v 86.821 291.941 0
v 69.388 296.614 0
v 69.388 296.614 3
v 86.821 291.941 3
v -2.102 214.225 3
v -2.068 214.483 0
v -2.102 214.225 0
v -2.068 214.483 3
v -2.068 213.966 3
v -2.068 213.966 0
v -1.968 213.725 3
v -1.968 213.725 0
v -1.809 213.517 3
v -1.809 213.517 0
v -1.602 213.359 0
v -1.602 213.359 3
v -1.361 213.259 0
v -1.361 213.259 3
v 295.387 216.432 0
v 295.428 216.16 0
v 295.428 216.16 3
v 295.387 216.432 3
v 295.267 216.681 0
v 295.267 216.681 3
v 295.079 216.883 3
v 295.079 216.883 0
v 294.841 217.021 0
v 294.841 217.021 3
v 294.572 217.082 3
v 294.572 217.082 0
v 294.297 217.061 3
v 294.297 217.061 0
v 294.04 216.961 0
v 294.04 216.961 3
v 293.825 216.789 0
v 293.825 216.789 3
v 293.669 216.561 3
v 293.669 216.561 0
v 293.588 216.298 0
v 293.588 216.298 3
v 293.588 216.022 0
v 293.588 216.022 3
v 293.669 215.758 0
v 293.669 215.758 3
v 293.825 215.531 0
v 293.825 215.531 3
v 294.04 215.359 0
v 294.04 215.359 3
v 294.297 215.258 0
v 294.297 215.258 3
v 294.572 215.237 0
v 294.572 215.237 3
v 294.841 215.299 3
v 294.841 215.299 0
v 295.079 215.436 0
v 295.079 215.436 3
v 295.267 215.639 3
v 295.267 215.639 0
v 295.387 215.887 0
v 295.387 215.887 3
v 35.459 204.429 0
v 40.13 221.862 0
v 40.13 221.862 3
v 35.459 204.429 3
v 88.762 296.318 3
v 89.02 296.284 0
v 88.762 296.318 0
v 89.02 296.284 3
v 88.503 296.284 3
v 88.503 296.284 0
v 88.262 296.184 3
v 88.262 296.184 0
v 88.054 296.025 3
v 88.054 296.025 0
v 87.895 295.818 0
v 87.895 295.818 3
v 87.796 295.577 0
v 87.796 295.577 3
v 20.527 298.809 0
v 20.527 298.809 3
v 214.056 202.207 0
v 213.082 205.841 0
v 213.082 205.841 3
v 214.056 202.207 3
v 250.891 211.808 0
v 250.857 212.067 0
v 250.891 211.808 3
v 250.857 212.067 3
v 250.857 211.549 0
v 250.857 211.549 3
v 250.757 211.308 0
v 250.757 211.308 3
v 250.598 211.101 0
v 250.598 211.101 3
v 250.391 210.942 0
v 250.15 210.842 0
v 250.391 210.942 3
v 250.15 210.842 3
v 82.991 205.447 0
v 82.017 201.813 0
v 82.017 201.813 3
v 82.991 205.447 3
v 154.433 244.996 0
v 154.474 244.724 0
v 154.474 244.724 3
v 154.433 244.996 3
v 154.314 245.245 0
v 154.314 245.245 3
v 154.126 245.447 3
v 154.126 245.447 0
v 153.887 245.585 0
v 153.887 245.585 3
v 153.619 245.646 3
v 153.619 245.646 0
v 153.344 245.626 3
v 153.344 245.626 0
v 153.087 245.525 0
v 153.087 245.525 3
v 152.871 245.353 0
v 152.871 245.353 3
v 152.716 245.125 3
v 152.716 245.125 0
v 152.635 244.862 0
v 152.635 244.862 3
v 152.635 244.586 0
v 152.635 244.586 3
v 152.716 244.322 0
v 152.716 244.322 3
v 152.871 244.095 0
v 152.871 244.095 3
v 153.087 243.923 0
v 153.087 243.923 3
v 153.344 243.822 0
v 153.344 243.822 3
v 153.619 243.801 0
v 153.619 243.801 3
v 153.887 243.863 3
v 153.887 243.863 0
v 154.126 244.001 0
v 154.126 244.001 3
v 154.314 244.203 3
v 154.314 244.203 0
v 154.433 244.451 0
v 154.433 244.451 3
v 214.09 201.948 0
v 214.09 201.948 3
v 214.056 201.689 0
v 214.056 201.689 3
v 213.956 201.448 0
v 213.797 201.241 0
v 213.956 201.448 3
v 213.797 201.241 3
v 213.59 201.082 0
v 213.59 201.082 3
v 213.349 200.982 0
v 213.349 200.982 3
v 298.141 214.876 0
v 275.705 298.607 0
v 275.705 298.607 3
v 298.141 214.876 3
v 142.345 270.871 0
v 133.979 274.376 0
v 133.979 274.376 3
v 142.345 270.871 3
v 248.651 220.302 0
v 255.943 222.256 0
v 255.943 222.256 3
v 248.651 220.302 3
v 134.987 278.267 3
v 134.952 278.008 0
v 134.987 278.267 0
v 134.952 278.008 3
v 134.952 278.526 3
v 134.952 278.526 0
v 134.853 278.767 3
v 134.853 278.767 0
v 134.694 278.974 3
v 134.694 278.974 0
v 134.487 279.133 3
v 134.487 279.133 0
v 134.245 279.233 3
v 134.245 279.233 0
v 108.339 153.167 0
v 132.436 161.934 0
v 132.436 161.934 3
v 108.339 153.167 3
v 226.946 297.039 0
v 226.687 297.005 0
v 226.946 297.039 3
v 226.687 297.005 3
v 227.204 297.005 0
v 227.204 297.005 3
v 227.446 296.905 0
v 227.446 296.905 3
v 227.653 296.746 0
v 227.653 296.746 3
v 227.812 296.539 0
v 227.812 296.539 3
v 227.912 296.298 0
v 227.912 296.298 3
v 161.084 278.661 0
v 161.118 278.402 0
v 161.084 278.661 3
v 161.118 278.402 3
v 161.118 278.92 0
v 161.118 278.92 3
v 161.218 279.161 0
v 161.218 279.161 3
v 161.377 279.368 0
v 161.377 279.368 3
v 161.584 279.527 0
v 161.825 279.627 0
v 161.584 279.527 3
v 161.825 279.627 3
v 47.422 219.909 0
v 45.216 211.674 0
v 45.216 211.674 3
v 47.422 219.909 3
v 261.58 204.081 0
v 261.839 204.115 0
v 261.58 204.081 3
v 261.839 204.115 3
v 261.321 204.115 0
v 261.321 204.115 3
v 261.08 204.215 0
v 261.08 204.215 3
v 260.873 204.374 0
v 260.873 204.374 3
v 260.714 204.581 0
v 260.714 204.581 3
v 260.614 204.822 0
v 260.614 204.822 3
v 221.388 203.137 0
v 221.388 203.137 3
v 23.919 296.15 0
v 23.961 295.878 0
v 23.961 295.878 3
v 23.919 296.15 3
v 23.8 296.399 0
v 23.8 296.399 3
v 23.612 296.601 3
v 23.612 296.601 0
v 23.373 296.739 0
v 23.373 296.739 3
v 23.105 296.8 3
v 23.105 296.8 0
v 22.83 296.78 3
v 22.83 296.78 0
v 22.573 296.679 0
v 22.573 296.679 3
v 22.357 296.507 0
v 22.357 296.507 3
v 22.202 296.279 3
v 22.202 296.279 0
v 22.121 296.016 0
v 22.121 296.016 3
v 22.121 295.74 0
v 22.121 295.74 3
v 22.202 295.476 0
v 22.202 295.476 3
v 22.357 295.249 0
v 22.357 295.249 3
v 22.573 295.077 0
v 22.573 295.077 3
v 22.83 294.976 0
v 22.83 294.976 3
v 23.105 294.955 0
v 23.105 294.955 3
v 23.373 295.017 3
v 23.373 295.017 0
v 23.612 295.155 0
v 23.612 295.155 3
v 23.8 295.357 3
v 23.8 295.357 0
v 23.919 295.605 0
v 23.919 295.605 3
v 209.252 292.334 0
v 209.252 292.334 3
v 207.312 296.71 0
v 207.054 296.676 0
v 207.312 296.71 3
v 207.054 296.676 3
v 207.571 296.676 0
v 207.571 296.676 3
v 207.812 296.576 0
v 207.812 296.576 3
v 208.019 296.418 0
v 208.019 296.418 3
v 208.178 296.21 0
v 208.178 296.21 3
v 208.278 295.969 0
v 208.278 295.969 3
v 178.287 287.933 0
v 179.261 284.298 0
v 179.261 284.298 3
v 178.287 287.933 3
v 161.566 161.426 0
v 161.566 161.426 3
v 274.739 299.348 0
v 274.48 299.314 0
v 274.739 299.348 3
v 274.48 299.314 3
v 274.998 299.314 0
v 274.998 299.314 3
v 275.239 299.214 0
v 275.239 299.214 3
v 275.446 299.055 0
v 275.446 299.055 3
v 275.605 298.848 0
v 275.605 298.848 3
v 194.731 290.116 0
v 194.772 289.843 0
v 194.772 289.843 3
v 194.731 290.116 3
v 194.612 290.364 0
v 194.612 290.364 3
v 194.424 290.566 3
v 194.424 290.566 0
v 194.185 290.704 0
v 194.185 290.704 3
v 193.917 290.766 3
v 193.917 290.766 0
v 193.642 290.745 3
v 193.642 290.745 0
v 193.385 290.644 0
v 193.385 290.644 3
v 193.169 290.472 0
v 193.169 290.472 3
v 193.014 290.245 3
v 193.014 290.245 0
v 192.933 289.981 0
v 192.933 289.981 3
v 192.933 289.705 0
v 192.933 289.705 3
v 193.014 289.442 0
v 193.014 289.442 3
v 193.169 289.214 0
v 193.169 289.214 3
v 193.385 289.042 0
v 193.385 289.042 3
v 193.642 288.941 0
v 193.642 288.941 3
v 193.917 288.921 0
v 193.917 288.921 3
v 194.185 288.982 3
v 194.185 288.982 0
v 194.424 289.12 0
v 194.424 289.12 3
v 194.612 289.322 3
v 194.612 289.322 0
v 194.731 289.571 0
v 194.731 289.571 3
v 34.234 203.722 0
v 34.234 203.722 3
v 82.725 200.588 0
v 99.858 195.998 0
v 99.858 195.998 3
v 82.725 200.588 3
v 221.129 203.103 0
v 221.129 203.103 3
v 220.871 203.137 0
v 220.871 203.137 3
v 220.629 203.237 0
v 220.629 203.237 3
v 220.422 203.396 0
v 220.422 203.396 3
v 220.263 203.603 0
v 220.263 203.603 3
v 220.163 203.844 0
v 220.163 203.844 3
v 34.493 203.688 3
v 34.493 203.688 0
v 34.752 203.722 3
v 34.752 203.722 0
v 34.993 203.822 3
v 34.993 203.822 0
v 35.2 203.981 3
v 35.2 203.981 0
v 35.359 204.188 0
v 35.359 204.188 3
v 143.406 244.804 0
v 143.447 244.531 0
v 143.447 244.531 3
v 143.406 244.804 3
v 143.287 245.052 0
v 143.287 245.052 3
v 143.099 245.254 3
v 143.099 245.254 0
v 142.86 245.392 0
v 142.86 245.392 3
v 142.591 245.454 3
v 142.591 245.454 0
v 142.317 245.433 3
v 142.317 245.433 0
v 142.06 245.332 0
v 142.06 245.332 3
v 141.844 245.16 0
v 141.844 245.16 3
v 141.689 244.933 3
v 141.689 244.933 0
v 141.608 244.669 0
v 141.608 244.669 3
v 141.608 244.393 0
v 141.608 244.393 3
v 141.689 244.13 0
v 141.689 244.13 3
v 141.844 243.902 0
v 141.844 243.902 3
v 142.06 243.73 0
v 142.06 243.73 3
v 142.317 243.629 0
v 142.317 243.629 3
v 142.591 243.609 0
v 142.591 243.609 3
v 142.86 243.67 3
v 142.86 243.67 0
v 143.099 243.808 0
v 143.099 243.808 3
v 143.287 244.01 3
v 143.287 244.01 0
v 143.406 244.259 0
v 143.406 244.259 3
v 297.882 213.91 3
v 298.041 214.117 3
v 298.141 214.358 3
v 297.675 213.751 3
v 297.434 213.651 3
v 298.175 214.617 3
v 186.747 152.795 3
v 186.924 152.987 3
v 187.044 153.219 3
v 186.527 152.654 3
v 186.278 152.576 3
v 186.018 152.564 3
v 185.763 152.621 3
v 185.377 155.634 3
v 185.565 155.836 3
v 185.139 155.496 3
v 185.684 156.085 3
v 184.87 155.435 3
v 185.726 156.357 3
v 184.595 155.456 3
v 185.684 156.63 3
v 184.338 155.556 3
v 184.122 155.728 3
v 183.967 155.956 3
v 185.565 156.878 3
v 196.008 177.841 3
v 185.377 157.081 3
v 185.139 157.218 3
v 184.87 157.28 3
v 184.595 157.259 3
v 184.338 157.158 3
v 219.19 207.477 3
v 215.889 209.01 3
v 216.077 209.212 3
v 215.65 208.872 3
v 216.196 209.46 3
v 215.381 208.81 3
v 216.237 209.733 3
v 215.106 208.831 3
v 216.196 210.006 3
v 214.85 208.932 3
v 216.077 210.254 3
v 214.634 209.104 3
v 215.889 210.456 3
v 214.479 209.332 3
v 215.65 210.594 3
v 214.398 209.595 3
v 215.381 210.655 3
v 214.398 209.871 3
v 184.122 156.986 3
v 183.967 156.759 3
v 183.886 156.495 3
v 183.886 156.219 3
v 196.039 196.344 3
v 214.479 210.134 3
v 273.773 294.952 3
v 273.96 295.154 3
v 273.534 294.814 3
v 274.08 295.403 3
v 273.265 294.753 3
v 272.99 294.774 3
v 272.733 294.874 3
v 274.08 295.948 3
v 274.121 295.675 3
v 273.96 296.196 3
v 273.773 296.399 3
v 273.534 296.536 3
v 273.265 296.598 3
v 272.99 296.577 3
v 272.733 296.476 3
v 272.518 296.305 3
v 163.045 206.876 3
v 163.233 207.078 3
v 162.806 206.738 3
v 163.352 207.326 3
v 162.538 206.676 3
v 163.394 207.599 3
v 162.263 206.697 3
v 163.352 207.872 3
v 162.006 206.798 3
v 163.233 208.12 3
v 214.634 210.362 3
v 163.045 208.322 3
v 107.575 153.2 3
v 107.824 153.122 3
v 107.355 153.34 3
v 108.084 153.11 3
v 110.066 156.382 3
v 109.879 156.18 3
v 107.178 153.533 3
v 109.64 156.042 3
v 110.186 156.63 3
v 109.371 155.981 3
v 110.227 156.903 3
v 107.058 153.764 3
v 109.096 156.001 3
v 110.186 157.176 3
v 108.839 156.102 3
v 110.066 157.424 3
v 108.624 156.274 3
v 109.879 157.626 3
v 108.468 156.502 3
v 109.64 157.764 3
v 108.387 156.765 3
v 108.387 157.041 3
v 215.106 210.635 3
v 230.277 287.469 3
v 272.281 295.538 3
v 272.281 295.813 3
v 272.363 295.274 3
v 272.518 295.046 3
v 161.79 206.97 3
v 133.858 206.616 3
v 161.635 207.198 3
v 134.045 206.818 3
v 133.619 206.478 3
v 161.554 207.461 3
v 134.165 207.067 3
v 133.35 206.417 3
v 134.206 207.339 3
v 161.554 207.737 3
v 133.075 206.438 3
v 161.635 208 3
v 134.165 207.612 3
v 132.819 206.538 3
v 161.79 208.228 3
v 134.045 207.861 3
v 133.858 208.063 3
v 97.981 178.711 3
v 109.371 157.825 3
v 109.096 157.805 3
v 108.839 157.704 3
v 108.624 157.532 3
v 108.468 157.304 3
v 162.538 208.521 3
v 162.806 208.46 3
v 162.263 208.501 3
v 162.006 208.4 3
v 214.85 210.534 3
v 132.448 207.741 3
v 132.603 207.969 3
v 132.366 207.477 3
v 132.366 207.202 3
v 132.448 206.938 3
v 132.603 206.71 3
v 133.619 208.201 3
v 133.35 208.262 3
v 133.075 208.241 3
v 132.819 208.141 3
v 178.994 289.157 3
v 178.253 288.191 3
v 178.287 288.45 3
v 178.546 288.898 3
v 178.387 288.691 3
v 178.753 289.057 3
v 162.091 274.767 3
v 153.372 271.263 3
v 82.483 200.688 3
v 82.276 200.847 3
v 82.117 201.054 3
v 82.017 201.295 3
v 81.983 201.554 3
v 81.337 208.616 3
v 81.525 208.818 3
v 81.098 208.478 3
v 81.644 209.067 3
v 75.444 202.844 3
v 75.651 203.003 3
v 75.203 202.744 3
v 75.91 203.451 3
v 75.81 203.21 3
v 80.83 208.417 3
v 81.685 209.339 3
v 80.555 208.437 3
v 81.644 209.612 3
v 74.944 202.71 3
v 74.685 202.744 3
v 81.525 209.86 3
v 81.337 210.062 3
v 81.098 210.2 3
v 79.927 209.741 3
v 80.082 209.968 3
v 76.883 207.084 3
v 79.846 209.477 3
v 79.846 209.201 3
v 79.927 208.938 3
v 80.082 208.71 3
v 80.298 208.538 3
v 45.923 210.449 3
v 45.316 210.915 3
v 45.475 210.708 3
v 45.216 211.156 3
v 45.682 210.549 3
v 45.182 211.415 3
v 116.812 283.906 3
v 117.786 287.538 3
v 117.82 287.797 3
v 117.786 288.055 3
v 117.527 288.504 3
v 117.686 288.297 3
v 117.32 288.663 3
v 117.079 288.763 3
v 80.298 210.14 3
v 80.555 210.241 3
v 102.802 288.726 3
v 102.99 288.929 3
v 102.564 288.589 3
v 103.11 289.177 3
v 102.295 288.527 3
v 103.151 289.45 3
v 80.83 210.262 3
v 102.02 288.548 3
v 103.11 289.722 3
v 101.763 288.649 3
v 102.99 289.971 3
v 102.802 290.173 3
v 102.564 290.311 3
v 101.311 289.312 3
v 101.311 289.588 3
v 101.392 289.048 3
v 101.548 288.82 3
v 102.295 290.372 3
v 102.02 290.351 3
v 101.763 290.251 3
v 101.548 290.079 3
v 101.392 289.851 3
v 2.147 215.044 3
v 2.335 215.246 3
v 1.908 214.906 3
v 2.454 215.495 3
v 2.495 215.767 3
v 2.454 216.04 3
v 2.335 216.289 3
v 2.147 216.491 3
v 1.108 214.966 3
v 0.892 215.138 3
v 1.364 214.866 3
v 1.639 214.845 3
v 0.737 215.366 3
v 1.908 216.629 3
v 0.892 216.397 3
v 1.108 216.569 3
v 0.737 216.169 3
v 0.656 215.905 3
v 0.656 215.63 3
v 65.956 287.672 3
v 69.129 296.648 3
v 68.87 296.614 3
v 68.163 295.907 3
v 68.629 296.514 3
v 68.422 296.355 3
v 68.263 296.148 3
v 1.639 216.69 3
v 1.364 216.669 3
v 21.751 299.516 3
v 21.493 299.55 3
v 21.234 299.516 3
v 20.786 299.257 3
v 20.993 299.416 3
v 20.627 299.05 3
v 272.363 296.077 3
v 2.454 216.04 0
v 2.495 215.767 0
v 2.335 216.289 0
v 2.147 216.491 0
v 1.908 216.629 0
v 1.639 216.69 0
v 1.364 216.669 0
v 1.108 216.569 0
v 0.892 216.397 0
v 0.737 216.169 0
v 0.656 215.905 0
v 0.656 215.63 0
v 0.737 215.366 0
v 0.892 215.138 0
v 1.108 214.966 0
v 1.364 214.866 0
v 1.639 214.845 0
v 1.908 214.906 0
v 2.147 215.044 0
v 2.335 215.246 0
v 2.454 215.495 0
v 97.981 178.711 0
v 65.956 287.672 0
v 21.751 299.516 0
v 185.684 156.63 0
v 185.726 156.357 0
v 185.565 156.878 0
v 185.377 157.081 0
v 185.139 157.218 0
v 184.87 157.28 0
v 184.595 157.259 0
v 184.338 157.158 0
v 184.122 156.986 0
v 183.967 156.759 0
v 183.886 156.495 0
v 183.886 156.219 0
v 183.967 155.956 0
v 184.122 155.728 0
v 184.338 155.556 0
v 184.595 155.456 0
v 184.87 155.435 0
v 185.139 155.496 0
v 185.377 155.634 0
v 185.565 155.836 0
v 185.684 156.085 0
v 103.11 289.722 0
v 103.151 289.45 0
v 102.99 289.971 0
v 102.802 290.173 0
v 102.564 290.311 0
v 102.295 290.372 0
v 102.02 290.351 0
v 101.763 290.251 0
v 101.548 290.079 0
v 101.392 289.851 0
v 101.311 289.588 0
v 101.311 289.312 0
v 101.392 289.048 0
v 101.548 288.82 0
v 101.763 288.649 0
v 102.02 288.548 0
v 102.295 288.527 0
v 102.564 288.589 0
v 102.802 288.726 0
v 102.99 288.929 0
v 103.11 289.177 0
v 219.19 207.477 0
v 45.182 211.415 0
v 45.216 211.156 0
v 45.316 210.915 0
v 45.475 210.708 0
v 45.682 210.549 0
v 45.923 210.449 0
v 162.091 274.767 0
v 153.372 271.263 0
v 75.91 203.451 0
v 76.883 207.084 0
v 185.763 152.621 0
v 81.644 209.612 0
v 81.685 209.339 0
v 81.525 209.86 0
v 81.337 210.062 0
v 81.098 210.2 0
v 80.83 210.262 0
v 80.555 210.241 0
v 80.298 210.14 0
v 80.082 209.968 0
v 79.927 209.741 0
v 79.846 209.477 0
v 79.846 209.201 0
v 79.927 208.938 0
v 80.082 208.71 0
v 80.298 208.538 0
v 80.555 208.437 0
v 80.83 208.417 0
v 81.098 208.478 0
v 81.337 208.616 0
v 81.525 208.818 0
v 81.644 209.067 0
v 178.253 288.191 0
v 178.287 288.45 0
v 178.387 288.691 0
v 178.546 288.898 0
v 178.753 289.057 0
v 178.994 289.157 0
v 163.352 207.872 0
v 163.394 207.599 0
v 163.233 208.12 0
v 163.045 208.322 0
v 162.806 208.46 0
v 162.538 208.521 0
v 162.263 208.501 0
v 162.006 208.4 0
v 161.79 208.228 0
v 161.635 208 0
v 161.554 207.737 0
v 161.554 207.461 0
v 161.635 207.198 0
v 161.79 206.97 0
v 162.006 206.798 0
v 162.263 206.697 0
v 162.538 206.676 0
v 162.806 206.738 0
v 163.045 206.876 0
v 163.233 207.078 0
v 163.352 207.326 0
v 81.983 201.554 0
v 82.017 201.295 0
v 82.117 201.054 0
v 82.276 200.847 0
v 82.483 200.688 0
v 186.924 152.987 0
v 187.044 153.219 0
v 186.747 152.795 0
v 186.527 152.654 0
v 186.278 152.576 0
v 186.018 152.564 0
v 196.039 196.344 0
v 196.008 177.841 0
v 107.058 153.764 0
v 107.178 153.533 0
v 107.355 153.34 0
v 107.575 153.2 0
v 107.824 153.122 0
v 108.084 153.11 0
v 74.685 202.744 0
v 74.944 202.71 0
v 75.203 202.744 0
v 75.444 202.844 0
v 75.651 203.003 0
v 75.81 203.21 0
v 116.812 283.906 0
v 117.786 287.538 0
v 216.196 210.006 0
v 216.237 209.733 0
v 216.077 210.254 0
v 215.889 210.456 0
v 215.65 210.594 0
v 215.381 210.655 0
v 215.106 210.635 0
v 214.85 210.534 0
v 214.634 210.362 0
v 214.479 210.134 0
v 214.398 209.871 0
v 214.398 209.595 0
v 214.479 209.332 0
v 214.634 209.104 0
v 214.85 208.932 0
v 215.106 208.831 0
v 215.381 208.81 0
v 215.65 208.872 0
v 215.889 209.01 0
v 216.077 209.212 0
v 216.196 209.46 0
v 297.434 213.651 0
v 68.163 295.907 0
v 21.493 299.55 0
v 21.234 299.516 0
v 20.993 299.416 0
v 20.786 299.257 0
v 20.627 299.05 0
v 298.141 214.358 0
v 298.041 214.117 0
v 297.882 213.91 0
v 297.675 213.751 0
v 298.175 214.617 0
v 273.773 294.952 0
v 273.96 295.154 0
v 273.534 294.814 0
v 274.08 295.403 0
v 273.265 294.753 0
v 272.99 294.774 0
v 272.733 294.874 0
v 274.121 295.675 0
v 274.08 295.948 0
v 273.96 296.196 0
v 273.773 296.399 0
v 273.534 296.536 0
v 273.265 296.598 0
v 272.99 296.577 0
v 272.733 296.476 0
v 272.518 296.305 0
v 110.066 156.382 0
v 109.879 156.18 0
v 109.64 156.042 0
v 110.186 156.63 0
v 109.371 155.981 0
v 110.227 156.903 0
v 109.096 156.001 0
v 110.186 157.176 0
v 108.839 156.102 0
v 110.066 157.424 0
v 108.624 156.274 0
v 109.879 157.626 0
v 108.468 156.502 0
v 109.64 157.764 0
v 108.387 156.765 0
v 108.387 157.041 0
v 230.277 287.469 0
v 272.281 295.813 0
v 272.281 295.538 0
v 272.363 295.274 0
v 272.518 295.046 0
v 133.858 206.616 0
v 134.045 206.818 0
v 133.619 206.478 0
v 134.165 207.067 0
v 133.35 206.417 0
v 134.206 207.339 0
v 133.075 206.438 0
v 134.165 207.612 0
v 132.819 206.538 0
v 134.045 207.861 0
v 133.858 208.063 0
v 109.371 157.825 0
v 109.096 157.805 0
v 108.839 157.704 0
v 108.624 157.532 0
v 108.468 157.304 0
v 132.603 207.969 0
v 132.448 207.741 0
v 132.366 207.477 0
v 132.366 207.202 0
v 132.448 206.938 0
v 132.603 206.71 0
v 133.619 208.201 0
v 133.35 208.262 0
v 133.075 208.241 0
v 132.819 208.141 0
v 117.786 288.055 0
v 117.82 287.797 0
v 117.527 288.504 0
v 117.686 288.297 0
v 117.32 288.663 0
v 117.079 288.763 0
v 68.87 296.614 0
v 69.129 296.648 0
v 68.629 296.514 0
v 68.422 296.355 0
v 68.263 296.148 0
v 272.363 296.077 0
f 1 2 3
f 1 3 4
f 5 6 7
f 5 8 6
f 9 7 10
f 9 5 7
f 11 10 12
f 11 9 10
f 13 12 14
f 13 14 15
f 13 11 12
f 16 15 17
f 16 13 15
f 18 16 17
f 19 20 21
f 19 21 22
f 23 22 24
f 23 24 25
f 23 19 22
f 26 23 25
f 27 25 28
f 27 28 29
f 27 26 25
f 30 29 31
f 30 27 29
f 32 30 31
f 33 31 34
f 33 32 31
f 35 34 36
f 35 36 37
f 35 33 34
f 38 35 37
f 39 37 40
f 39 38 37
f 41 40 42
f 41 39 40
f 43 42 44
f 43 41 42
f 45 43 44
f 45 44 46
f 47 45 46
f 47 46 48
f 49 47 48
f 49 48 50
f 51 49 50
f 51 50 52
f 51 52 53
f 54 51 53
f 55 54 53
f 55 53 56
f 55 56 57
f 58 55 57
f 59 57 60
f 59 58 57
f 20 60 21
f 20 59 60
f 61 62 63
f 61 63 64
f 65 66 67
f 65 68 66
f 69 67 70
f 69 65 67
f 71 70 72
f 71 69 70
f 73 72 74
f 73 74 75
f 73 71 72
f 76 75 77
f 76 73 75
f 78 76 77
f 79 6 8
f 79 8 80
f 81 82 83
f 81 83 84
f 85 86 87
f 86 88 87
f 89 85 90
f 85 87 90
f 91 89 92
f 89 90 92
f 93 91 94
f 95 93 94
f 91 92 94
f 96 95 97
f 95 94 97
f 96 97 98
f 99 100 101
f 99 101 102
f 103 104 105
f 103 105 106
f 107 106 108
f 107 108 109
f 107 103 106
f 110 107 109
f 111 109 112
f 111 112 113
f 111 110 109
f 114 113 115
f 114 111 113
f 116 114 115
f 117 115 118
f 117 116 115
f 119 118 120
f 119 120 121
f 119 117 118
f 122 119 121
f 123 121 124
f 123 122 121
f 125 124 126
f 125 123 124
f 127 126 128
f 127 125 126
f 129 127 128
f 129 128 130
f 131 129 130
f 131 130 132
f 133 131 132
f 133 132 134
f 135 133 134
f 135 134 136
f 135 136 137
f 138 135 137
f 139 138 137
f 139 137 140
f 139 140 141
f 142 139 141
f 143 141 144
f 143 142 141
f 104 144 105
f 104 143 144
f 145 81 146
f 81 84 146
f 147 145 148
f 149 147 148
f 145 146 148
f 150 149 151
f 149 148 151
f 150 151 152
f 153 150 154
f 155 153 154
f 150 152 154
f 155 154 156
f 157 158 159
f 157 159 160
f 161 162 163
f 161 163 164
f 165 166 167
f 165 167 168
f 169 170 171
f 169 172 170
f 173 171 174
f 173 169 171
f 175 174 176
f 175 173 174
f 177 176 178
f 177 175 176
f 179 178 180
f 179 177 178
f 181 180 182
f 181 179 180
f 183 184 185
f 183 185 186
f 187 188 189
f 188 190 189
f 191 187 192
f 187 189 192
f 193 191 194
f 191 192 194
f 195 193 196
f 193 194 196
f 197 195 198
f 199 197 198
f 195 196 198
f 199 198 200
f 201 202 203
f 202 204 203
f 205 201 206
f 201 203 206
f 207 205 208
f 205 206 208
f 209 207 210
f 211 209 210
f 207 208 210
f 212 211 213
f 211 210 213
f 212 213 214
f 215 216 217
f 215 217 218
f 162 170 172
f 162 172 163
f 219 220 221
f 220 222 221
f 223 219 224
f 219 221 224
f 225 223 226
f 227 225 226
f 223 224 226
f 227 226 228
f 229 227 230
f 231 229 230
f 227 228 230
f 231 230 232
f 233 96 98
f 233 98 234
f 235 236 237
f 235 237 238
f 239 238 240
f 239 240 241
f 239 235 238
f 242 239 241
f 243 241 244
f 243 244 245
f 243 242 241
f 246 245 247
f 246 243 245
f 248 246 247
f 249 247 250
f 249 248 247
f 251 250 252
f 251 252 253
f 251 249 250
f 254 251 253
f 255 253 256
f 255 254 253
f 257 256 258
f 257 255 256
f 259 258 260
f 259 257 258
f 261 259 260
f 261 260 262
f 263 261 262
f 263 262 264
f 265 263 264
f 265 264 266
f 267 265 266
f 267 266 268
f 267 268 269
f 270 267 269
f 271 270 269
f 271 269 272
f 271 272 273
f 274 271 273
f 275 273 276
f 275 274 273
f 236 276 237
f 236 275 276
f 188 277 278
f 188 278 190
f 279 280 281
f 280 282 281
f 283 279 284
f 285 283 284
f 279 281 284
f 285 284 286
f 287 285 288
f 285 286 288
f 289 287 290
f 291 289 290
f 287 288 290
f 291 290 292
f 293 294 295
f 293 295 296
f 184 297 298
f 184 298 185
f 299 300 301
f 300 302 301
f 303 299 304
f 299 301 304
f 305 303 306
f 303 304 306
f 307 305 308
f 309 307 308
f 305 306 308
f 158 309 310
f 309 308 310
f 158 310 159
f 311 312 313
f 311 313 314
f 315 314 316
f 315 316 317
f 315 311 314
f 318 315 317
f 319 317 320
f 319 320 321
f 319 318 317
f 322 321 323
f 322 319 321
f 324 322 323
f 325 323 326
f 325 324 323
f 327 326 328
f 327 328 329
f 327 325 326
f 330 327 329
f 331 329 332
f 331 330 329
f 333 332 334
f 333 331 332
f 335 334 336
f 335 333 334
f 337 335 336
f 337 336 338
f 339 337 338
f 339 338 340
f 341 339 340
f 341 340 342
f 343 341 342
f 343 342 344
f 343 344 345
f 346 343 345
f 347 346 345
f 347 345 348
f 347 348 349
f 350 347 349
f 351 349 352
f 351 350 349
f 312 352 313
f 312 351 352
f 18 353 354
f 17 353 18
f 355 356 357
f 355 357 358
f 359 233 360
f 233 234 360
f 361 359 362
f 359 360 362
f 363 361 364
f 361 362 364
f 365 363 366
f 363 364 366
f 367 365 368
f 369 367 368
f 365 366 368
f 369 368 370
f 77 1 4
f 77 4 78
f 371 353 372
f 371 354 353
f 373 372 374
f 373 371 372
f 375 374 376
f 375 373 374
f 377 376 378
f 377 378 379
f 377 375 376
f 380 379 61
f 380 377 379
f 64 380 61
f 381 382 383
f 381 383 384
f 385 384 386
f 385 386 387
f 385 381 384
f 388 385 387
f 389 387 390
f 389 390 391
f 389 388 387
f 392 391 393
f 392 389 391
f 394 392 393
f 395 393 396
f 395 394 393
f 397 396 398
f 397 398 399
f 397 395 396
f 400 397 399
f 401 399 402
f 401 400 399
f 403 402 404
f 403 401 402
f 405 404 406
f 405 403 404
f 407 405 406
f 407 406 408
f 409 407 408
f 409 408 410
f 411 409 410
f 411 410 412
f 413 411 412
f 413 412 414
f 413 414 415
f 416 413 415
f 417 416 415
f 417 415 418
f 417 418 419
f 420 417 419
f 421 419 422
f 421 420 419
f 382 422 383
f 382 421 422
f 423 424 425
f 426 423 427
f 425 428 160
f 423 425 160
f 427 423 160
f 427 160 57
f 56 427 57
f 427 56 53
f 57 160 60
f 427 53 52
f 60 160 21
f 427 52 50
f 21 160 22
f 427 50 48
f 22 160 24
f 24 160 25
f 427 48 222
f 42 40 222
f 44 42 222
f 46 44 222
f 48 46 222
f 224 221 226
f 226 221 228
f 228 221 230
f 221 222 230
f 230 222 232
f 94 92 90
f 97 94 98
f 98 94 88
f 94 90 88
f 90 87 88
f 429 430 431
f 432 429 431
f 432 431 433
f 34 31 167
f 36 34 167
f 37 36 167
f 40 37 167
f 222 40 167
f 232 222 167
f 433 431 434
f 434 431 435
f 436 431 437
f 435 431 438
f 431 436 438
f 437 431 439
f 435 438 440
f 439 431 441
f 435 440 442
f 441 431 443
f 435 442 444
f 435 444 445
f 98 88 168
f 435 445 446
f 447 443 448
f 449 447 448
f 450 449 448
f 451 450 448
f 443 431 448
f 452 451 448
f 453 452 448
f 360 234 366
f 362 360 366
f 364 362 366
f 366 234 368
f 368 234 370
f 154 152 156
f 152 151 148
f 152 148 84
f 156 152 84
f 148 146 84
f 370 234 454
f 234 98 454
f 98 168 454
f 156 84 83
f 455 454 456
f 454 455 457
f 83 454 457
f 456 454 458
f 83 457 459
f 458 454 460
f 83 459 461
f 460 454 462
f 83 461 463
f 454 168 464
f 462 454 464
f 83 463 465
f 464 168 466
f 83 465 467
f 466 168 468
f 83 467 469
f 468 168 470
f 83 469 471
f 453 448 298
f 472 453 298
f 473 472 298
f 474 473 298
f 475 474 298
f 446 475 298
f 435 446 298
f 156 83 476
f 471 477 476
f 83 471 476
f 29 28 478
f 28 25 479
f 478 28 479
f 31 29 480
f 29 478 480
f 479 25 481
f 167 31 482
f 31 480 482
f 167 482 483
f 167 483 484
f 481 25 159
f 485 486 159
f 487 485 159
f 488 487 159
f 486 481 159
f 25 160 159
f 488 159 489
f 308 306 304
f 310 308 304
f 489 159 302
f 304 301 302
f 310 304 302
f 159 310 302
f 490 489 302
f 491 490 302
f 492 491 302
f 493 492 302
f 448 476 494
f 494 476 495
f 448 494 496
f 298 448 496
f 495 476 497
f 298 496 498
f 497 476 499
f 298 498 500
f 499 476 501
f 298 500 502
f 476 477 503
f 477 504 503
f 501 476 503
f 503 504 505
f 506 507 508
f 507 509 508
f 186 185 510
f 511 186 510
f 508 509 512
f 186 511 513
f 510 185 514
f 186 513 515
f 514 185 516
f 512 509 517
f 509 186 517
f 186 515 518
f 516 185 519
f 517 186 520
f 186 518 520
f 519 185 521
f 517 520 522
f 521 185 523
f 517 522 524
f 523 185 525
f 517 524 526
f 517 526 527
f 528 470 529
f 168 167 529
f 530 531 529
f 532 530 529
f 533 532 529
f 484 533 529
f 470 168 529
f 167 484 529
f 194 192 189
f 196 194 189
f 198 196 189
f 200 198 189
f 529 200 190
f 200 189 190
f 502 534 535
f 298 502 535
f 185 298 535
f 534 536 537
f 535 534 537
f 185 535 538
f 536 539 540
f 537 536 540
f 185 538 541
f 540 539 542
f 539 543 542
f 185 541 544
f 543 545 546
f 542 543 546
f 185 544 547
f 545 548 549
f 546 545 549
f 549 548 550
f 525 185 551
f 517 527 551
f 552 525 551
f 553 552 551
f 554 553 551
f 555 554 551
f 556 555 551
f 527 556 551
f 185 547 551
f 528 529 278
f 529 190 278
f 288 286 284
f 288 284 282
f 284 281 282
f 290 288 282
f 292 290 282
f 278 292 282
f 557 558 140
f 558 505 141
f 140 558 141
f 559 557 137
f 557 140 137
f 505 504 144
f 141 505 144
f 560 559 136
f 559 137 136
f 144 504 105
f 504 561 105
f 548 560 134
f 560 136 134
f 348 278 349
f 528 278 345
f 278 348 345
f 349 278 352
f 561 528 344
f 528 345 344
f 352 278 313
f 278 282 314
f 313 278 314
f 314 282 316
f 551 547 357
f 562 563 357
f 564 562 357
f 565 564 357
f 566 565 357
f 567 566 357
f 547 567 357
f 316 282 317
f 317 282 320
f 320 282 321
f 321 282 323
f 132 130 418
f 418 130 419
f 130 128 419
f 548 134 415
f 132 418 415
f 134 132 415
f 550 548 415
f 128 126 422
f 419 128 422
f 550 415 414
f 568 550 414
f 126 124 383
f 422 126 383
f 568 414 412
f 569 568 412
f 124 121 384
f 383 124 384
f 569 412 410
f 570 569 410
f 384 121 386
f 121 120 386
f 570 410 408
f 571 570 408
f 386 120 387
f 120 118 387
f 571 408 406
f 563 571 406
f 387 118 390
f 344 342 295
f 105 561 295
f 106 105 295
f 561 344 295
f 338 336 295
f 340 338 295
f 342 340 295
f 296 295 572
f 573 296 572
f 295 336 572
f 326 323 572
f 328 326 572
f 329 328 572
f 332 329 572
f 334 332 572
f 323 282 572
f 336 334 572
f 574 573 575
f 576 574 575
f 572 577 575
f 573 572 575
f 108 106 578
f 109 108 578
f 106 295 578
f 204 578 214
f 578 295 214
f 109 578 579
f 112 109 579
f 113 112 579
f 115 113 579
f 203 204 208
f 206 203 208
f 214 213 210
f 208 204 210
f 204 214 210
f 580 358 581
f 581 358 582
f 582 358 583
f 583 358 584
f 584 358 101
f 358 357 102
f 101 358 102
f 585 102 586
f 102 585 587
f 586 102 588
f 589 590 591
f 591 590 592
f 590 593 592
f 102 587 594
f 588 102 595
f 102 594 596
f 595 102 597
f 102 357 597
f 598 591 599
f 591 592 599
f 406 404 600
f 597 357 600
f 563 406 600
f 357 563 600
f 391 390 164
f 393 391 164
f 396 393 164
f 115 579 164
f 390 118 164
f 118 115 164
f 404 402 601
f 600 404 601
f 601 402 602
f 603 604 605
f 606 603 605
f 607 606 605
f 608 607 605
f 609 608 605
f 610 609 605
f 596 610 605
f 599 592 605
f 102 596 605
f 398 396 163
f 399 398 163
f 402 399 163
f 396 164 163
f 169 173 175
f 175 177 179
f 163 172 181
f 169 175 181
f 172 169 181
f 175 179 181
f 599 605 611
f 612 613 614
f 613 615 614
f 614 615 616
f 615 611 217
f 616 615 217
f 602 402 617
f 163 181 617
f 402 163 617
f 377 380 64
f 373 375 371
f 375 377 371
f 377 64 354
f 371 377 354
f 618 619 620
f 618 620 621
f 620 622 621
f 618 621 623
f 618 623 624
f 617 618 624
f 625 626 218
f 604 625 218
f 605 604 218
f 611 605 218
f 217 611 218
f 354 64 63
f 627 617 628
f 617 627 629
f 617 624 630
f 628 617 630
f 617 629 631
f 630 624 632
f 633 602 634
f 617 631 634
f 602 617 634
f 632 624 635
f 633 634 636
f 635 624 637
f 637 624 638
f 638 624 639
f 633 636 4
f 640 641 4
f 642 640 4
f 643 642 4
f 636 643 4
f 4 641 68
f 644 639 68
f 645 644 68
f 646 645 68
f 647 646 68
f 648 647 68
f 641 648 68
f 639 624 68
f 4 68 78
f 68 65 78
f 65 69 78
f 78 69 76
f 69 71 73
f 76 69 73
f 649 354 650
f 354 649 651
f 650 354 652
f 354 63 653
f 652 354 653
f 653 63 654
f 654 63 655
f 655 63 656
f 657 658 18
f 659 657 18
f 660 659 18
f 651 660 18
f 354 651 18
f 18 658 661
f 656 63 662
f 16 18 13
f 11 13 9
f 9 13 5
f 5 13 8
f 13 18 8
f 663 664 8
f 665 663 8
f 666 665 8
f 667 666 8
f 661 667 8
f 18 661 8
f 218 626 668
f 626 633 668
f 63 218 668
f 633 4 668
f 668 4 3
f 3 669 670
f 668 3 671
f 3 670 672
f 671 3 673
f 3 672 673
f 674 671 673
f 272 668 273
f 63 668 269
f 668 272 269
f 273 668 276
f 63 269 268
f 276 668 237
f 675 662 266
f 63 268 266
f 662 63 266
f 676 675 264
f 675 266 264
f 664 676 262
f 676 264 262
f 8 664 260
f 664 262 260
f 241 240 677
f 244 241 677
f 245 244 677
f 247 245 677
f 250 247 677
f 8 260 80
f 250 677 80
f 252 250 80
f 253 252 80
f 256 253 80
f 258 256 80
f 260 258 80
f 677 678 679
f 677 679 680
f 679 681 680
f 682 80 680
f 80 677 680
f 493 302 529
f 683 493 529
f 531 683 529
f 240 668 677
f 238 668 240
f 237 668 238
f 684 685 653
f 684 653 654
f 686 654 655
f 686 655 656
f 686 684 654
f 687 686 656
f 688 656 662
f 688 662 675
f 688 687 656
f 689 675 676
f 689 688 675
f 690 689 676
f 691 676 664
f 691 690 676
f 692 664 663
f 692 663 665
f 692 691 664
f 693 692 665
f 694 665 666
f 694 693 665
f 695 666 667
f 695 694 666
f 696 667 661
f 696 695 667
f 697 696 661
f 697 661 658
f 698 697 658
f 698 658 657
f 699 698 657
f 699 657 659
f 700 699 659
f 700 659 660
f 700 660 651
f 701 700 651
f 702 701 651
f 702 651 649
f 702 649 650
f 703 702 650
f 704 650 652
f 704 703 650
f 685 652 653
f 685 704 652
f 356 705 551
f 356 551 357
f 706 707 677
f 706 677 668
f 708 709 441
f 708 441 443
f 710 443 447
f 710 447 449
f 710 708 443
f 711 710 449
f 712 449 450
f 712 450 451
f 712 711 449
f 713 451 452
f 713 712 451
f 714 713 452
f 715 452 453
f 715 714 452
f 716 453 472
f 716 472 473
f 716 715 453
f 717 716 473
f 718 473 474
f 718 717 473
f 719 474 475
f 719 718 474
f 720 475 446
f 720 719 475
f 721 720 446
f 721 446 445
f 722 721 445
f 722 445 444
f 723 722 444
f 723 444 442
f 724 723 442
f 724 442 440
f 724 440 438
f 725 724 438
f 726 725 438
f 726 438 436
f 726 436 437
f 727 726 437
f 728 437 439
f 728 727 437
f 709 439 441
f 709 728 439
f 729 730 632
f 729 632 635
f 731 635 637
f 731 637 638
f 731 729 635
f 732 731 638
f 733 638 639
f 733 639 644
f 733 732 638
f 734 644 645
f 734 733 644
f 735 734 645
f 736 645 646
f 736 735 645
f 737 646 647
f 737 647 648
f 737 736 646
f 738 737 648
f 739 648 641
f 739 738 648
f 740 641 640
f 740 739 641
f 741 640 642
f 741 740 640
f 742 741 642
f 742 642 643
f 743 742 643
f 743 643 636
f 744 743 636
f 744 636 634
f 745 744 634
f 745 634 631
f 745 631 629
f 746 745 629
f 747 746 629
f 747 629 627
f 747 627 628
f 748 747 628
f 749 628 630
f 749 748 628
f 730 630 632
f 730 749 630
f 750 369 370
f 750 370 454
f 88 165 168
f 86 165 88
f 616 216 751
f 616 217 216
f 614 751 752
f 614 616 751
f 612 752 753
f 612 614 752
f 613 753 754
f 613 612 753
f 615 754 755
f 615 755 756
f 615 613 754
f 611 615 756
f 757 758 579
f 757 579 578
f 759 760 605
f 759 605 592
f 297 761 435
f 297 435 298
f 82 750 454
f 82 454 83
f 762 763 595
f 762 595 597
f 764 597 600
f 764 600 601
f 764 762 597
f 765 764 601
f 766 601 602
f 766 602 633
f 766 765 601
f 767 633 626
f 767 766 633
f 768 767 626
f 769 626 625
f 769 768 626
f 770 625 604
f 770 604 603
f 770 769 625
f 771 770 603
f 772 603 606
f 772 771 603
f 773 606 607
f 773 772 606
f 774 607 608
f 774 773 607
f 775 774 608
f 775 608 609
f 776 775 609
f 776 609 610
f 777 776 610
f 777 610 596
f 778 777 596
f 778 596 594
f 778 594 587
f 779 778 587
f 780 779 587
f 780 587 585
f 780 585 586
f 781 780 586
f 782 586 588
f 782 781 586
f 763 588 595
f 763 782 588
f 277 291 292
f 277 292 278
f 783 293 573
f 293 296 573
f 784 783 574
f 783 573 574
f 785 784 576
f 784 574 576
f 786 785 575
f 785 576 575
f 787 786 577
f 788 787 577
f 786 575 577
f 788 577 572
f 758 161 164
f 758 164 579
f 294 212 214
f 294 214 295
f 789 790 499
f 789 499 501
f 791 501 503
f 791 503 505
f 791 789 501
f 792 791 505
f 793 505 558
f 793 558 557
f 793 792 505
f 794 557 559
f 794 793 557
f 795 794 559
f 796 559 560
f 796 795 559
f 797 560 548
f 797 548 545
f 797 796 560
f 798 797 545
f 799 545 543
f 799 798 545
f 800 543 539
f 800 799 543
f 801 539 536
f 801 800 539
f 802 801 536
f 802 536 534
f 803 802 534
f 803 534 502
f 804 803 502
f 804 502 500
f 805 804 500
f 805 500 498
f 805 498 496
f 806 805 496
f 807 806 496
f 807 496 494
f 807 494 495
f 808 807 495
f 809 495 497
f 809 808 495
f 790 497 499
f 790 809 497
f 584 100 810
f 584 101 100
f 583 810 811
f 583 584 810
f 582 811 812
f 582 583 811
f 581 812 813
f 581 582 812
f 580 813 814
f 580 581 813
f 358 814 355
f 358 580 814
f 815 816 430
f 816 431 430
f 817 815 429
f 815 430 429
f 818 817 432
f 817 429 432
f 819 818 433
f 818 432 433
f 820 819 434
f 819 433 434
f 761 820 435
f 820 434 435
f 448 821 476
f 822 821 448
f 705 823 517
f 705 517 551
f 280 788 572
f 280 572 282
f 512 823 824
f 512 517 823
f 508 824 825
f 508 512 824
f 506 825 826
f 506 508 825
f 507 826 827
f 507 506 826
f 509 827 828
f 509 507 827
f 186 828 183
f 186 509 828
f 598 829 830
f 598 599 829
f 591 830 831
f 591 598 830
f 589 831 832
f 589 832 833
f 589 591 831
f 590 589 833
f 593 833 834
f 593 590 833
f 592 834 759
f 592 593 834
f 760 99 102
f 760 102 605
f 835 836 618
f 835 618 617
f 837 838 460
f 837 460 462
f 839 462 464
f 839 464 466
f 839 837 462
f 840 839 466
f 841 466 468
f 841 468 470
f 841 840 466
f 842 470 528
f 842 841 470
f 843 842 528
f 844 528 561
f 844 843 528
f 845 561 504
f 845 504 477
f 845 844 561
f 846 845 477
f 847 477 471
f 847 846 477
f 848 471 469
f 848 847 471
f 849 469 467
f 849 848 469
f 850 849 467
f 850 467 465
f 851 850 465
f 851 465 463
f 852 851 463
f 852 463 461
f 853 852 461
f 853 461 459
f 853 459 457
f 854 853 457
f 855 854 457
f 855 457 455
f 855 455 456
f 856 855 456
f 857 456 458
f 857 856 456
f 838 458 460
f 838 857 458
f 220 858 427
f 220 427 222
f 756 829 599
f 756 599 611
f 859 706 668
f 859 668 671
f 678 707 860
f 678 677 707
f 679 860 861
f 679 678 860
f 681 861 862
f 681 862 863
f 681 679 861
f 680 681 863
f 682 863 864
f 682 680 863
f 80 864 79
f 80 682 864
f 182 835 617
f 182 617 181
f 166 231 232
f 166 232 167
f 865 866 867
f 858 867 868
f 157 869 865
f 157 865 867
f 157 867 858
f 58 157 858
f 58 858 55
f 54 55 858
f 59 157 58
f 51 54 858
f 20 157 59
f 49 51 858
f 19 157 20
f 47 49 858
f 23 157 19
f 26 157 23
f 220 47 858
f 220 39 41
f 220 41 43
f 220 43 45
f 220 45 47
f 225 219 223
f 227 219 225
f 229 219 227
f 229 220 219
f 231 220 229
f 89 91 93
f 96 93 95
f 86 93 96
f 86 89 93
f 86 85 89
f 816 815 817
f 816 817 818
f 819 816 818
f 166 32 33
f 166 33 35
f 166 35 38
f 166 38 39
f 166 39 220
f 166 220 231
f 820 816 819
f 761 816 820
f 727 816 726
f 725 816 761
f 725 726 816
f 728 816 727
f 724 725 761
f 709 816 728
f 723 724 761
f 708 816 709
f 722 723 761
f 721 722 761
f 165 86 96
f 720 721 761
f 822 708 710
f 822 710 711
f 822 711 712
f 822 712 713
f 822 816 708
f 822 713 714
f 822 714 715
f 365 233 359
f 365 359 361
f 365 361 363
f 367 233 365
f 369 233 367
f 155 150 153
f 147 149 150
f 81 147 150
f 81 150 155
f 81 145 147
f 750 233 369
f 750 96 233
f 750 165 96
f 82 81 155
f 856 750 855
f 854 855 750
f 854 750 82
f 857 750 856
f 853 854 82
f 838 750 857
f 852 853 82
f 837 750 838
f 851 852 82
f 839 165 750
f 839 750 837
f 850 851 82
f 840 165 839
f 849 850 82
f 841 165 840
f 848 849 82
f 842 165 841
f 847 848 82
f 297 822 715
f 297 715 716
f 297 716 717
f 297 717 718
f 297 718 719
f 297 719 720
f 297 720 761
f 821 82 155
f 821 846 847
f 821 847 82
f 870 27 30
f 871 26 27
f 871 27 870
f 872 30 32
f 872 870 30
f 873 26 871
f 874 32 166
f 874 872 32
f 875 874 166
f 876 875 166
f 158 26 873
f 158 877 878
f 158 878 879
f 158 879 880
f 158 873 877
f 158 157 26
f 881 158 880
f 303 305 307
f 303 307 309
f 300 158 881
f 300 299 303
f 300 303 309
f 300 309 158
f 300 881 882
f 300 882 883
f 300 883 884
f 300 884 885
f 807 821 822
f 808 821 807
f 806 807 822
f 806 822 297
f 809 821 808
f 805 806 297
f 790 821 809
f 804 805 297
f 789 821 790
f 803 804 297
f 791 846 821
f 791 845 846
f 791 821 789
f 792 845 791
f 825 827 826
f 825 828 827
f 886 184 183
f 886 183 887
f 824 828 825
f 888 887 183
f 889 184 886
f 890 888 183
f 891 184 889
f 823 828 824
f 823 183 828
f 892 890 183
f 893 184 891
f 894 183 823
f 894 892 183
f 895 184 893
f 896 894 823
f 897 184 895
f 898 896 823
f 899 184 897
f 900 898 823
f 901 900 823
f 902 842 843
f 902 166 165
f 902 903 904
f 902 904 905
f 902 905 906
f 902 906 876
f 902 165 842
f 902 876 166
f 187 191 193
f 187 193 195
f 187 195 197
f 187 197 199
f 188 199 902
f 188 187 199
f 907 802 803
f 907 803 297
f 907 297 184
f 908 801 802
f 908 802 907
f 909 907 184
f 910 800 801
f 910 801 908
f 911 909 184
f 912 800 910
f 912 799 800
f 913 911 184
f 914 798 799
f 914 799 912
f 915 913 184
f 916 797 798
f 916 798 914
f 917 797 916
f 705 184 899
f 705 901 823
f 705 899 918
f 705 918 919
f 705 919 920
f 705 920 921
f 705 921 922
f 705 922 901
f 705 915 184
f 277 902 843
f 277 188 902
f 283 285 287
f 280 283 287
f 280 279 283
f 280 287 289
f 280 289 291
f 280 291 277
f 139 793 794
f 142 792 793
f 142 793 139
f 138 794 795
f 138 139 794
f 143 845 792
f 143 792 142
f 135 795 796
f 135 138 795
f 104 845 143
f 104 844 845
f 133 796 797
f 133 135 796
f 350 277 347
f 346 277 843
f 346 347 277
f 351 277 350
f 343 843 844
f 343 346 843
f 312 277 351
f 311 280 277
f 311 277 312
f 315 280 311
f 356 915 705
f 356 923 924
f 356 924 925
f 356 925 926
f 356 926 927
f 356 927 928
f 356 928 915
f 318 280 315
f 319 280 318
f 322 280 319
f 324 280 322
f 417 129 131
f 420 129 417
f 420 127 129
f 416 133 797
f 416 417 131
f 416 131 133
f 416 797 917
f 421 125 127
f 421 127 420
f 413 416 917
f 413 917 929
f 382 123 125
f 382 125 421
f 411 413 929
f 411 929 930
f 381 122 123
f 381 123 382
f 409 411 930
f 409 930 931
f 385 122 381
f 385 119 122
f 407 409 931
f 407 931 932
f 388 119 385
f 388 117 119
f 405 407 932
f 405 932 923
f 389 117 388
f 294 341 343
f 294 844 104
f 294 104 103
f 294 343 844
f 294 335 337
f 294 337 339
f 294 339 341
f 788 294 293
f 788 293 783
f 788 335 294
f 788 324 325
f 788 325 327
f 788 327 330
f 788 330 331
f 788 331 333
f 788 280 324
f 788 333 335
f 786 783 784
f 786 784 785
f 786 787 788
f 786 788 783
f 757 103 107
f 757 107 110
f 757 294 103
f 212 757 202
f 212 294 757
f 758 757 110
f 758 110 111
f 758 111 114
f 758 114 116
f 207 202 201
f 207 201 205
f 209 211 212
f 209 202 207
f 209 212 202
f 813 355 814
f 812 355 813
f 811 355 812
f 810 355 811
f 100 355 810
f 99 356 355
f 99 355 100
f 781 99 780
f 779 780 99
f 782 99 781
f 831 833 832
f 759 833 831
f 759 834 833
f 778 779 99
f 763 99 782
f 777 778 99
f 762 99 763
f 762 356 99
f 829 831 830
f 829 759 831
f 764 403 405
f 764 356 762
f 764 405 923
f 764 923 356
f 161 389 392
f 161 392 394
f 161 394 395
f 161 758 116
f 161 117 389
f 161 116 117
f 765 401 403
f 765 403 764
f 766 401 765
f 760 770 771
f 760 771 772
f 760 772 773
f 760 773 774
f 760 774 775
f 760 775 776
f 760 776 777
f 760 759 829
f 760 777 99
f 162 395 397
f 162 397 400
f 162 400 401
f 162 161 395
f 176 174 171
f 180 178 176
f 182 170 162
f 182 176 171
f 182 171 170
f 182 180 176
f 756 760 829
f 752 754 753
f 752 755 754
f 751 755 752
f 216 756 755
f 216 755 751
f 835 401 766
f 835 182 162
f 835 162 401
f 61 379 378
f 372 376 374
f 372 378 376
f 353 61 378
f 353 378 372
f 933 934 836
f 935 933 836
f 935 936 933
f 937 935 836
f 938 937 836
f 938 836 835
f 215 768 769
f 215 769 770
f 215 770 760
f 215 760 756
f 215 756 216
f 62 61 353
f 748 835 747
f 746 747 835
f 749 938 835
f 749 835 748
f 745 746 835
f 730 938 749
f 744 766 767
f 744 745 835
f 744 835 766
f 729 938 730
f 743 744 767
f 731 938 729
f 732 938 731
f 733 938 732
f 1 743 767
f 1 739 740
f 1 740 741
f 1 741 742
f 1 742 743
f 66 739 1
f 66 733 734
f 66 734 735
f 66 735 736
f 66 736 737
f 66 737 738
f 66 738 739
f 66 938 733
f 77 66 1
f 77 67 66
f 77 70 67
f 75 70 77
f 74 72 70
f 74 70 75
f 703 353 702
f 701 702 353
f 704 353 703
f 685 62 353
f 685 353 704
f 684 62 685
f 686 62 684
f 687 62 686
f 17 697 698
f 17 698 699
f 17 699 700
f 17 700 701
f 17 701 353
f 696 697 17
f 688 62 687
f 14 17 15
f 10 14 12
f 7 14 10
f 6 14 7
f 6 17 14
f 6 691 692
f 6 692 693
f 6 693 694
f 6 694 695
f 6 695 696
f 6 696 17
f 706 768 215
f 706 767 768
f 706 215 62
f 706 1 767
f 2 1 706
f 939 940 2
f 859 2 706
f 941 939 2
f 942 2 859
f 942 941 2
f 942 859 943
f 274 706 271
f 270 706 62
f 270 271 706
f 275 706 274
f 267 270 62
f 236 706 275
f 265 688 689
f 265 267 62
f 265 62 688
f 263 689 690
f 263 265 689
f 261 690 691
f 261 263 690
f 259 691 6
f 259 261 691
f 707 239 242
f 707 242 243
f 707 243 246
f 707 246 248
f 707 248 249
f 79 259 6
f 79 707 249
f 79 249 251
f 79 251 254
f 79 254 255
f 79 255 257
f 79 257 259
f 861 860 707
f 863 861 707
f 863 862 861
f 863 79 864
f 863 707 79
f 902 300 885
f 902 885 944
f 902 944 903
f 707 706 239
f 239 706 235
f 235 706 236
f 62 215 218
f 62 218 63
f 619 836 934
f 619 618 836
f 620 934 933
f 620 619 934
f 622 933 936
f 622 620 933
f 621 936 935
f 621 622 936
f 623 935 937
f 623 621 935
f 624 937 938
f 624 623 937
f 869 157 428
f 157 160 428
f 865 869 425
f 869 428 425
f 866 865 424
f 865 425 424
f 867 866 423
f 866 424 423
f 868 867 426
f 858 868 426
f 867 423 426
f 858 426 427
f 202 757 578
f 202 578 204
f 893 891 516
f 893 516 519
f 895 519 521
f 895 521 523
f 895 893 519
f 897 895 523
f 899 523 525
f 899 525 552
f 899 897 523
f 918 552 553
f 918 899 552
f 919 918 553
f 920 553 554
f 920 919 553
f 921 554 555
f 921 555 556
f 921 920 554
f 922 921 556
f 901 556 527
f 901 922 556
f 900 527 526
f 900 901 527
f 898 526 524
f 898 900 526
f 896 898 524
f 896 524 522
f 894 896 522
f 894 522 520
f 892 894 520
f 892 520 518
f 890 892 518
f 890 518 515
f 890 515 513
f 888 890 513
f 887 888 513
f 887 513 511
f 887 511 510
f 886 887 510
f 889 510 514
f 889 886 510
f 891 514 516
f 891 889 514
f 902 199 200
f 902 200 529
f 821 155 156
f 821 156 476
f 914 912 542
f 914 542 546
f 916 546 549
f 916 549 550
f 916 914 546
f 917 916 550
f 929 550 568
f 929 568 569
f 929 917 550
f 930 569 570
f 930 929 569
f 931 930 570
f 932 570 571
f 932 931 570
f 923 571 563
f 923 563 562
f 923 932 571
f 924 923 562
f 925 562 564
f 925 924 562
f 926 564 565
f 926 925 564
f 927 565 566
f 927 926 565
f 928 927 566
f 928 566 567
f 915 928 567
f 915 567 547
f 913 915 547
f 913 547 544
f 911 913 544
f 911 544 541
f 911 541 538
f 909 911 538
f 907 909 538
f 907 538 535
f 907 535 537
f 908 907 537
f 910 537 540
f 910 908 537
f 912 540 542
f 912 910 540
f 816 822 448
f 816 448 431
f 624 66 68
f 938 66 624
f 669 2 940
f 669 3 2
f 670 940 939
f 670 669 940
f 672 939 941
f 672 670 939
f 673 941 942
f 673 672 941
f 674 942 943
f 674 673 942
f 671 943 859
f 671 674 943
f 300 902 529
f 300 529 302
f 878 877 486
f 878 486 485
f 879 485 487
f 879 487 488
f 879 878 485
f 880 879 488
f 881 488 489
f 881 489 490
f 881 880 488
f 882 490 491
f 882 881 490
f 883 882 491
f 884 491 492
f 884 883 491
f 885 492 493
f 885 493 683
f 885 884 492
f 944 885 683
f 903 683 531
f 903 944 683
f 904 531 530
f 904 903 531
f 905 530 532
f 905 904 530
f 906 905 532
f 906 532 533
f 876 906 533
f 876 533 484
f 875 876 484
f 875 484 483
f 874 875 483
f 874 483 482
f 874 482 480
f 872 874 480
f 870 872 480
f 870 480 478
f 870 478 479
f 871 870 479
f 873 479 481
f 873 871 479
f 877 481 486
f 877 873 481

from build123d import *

# Parameters (mm, degrees)
MODEL_R             = 0.925
BOSS_EXTRUDE1_DEPTH = 3
FILLET1_R           = 1


with BuildPart() as part:
    # Model → Boss-Extrude1 (new body)
    with BuildSketch(Plane.XY):
        Polygon((142.344747242, 270.871489374), (153.37187249, 271.263447748), (162.091473536, 274.767362889), (160.85900272, 279.367807803), (179.260689602, 284.297666211), (178.028627015, 288.898354165), (208.019481767, 296.93522173), (209.252454514, 292.334187025), (227.65276755, 297.263677376), (230.276744897, 287.46915479), (275.445873116, 299.572514112), (298.39980436, 213.909597233), (260.87259576, 203.855963236), (255.943287021, 222.255598366), (248.650938057, 220.301667543), (251.115775513, 211.101166572), (220.422247557, 202.878292884), (219.189771603, 207.477473721), (213.081966369, 205.841177268), (214.314693354, 201.241059665), (196.039346948, 196.343682115), (196.007810089, 177.840578221), (186.702312667, 152.27893851), (161.565977706, 161.426447529), (132.435827139, 161.934428279), (107.399642776, 152.824765622), (97.980730454, 178.710864183), (99.858189105, 195.997881416), (81.758593313, 200.846808858), (82.991121062, 205.447466285), (76.882860045, 207.083884844), (75.650856625, 202.485184579), (44.956891994, 210.708175253), (47.421773629, 219.90863481), (40.129543563, 221.862285479), (35.199939127, 203.463086712), (-2.32684459, 213.517448416), (20.785545351, 299.774827661), (65.955825932, 287.671594898), (68.42160019, 296.872525865), (86.820985153, 291.940533454), (88.054439652, 296.542595671), (118.044472643, 288.503706576), (116.812112756, 283.905728394), (135.211333861, 278.973779905), (133.979081507, 274.376202933), align=None)
        with Locations((23.035554, 295.877718337)):
            Circle(MODEL_R, mode=Mode.SUBTRACT)
        with Locations((109.301822433, 156.902965293)):
            Circle(MODEL_R, mode=Mode.SUBTRACT)
        with Locations((184.800560745, 156.35733766)):
            Circle(MODEL_R, mode=Mode.SUBTRACT)
        with Locations((193.847437398, 289.84318413)):
            Circle(MODEL_R, mode=Mode.SUBTRACT)
        with Locations((102.225689846, 289.449650012)):
            Circle(MODEL_R, mode=Mode.SUBTRACT)
        with Locations((273.195899511, 295.675384555)):
            Circle(MODEL_R, mode=Mode.SUBTRACT)
        with Locations((1.570241786, 215.767496811)):
            Circle(MODEL_R, mode=Mode.SUBTRACT)
        with Locations((294.502731407, 216.159668876)):
            Circle(MODEL_R, mode=Mode.SUBTRACT)
        with Locations((80.760413887, 209.339268578)):
            Circle(MODEL_R, mode=Mode.SUBTRACT)
        with Locations((215.312231294, 209.732861073)):
            Circle(MODEL_R, mode=Mode.SUBTRACT)
        with Locations((133.281102646, 207.339464548)):
            Circle(MODEL_R, mode=Mode.SUBTRACT)
        with Locations((162.46850521, 207.598897954)):
            Circle(MODEL_R, mode=Mode.SUBTRACT)
        with Locations((142.522359716, 244.531276159)):
            Circle(MODEL_R, mode=Mode.SUBTRACT)
        with Locations((153.549484965, 244.723703681)):
            Circle(MODEL_R, mode=Mode.SUBTRACT)
    extrude(amount=BOSS_EXTRUDE1_DEPTH)

    # Fillet1
    fillet1_edges = [part.edges().sort_by_distance(p)[0] for p in [
        (-2.32684459, 213.517448416, 1.5),
        (20.785545351, 299.774827661, 1.5),
        (68.42160019, 296.872525865, 1.5),
        (88.054439652, 296.542595671, 1.5),
        (118.044472643, 288.503706576, 1.5),
        (135.211333861, 278.973779905, 1.5),
        (160.85900272, 279.367807803, 1.5),
        (178.028627015, 288.898354165, 1.5),
        (208.019481767, 296.93522173, 1.5),
        (227.65276755, 297.263677376, 1.5),
        (275.445873116, 299.572514112, 1.5),
        (298.39980436, 213.909597233, 1.5),
        (260.87259576, 203.855963236, 1.5),
        (251.115775513, 211.101166572, 1.5),
        (220.422247557, 202.878292884, 1.5),
        (214.314693354, 201.241059665, 1.5),
        (186.702312667, 152.27893851, 1.5),
        (107.399642776, 152.824765622, 1.5),
        (81.758593313, 200.846808858, 1.5),
        (75.650856625, 202.485184579, 1.5),
        (44.956891994, 210.708175253, 1.5),
        (35.199939127, 203.463086712, 1.5),
    ]]
    fillet(fillet1_edges, radius=FILLET1_R)


solid = part.part
